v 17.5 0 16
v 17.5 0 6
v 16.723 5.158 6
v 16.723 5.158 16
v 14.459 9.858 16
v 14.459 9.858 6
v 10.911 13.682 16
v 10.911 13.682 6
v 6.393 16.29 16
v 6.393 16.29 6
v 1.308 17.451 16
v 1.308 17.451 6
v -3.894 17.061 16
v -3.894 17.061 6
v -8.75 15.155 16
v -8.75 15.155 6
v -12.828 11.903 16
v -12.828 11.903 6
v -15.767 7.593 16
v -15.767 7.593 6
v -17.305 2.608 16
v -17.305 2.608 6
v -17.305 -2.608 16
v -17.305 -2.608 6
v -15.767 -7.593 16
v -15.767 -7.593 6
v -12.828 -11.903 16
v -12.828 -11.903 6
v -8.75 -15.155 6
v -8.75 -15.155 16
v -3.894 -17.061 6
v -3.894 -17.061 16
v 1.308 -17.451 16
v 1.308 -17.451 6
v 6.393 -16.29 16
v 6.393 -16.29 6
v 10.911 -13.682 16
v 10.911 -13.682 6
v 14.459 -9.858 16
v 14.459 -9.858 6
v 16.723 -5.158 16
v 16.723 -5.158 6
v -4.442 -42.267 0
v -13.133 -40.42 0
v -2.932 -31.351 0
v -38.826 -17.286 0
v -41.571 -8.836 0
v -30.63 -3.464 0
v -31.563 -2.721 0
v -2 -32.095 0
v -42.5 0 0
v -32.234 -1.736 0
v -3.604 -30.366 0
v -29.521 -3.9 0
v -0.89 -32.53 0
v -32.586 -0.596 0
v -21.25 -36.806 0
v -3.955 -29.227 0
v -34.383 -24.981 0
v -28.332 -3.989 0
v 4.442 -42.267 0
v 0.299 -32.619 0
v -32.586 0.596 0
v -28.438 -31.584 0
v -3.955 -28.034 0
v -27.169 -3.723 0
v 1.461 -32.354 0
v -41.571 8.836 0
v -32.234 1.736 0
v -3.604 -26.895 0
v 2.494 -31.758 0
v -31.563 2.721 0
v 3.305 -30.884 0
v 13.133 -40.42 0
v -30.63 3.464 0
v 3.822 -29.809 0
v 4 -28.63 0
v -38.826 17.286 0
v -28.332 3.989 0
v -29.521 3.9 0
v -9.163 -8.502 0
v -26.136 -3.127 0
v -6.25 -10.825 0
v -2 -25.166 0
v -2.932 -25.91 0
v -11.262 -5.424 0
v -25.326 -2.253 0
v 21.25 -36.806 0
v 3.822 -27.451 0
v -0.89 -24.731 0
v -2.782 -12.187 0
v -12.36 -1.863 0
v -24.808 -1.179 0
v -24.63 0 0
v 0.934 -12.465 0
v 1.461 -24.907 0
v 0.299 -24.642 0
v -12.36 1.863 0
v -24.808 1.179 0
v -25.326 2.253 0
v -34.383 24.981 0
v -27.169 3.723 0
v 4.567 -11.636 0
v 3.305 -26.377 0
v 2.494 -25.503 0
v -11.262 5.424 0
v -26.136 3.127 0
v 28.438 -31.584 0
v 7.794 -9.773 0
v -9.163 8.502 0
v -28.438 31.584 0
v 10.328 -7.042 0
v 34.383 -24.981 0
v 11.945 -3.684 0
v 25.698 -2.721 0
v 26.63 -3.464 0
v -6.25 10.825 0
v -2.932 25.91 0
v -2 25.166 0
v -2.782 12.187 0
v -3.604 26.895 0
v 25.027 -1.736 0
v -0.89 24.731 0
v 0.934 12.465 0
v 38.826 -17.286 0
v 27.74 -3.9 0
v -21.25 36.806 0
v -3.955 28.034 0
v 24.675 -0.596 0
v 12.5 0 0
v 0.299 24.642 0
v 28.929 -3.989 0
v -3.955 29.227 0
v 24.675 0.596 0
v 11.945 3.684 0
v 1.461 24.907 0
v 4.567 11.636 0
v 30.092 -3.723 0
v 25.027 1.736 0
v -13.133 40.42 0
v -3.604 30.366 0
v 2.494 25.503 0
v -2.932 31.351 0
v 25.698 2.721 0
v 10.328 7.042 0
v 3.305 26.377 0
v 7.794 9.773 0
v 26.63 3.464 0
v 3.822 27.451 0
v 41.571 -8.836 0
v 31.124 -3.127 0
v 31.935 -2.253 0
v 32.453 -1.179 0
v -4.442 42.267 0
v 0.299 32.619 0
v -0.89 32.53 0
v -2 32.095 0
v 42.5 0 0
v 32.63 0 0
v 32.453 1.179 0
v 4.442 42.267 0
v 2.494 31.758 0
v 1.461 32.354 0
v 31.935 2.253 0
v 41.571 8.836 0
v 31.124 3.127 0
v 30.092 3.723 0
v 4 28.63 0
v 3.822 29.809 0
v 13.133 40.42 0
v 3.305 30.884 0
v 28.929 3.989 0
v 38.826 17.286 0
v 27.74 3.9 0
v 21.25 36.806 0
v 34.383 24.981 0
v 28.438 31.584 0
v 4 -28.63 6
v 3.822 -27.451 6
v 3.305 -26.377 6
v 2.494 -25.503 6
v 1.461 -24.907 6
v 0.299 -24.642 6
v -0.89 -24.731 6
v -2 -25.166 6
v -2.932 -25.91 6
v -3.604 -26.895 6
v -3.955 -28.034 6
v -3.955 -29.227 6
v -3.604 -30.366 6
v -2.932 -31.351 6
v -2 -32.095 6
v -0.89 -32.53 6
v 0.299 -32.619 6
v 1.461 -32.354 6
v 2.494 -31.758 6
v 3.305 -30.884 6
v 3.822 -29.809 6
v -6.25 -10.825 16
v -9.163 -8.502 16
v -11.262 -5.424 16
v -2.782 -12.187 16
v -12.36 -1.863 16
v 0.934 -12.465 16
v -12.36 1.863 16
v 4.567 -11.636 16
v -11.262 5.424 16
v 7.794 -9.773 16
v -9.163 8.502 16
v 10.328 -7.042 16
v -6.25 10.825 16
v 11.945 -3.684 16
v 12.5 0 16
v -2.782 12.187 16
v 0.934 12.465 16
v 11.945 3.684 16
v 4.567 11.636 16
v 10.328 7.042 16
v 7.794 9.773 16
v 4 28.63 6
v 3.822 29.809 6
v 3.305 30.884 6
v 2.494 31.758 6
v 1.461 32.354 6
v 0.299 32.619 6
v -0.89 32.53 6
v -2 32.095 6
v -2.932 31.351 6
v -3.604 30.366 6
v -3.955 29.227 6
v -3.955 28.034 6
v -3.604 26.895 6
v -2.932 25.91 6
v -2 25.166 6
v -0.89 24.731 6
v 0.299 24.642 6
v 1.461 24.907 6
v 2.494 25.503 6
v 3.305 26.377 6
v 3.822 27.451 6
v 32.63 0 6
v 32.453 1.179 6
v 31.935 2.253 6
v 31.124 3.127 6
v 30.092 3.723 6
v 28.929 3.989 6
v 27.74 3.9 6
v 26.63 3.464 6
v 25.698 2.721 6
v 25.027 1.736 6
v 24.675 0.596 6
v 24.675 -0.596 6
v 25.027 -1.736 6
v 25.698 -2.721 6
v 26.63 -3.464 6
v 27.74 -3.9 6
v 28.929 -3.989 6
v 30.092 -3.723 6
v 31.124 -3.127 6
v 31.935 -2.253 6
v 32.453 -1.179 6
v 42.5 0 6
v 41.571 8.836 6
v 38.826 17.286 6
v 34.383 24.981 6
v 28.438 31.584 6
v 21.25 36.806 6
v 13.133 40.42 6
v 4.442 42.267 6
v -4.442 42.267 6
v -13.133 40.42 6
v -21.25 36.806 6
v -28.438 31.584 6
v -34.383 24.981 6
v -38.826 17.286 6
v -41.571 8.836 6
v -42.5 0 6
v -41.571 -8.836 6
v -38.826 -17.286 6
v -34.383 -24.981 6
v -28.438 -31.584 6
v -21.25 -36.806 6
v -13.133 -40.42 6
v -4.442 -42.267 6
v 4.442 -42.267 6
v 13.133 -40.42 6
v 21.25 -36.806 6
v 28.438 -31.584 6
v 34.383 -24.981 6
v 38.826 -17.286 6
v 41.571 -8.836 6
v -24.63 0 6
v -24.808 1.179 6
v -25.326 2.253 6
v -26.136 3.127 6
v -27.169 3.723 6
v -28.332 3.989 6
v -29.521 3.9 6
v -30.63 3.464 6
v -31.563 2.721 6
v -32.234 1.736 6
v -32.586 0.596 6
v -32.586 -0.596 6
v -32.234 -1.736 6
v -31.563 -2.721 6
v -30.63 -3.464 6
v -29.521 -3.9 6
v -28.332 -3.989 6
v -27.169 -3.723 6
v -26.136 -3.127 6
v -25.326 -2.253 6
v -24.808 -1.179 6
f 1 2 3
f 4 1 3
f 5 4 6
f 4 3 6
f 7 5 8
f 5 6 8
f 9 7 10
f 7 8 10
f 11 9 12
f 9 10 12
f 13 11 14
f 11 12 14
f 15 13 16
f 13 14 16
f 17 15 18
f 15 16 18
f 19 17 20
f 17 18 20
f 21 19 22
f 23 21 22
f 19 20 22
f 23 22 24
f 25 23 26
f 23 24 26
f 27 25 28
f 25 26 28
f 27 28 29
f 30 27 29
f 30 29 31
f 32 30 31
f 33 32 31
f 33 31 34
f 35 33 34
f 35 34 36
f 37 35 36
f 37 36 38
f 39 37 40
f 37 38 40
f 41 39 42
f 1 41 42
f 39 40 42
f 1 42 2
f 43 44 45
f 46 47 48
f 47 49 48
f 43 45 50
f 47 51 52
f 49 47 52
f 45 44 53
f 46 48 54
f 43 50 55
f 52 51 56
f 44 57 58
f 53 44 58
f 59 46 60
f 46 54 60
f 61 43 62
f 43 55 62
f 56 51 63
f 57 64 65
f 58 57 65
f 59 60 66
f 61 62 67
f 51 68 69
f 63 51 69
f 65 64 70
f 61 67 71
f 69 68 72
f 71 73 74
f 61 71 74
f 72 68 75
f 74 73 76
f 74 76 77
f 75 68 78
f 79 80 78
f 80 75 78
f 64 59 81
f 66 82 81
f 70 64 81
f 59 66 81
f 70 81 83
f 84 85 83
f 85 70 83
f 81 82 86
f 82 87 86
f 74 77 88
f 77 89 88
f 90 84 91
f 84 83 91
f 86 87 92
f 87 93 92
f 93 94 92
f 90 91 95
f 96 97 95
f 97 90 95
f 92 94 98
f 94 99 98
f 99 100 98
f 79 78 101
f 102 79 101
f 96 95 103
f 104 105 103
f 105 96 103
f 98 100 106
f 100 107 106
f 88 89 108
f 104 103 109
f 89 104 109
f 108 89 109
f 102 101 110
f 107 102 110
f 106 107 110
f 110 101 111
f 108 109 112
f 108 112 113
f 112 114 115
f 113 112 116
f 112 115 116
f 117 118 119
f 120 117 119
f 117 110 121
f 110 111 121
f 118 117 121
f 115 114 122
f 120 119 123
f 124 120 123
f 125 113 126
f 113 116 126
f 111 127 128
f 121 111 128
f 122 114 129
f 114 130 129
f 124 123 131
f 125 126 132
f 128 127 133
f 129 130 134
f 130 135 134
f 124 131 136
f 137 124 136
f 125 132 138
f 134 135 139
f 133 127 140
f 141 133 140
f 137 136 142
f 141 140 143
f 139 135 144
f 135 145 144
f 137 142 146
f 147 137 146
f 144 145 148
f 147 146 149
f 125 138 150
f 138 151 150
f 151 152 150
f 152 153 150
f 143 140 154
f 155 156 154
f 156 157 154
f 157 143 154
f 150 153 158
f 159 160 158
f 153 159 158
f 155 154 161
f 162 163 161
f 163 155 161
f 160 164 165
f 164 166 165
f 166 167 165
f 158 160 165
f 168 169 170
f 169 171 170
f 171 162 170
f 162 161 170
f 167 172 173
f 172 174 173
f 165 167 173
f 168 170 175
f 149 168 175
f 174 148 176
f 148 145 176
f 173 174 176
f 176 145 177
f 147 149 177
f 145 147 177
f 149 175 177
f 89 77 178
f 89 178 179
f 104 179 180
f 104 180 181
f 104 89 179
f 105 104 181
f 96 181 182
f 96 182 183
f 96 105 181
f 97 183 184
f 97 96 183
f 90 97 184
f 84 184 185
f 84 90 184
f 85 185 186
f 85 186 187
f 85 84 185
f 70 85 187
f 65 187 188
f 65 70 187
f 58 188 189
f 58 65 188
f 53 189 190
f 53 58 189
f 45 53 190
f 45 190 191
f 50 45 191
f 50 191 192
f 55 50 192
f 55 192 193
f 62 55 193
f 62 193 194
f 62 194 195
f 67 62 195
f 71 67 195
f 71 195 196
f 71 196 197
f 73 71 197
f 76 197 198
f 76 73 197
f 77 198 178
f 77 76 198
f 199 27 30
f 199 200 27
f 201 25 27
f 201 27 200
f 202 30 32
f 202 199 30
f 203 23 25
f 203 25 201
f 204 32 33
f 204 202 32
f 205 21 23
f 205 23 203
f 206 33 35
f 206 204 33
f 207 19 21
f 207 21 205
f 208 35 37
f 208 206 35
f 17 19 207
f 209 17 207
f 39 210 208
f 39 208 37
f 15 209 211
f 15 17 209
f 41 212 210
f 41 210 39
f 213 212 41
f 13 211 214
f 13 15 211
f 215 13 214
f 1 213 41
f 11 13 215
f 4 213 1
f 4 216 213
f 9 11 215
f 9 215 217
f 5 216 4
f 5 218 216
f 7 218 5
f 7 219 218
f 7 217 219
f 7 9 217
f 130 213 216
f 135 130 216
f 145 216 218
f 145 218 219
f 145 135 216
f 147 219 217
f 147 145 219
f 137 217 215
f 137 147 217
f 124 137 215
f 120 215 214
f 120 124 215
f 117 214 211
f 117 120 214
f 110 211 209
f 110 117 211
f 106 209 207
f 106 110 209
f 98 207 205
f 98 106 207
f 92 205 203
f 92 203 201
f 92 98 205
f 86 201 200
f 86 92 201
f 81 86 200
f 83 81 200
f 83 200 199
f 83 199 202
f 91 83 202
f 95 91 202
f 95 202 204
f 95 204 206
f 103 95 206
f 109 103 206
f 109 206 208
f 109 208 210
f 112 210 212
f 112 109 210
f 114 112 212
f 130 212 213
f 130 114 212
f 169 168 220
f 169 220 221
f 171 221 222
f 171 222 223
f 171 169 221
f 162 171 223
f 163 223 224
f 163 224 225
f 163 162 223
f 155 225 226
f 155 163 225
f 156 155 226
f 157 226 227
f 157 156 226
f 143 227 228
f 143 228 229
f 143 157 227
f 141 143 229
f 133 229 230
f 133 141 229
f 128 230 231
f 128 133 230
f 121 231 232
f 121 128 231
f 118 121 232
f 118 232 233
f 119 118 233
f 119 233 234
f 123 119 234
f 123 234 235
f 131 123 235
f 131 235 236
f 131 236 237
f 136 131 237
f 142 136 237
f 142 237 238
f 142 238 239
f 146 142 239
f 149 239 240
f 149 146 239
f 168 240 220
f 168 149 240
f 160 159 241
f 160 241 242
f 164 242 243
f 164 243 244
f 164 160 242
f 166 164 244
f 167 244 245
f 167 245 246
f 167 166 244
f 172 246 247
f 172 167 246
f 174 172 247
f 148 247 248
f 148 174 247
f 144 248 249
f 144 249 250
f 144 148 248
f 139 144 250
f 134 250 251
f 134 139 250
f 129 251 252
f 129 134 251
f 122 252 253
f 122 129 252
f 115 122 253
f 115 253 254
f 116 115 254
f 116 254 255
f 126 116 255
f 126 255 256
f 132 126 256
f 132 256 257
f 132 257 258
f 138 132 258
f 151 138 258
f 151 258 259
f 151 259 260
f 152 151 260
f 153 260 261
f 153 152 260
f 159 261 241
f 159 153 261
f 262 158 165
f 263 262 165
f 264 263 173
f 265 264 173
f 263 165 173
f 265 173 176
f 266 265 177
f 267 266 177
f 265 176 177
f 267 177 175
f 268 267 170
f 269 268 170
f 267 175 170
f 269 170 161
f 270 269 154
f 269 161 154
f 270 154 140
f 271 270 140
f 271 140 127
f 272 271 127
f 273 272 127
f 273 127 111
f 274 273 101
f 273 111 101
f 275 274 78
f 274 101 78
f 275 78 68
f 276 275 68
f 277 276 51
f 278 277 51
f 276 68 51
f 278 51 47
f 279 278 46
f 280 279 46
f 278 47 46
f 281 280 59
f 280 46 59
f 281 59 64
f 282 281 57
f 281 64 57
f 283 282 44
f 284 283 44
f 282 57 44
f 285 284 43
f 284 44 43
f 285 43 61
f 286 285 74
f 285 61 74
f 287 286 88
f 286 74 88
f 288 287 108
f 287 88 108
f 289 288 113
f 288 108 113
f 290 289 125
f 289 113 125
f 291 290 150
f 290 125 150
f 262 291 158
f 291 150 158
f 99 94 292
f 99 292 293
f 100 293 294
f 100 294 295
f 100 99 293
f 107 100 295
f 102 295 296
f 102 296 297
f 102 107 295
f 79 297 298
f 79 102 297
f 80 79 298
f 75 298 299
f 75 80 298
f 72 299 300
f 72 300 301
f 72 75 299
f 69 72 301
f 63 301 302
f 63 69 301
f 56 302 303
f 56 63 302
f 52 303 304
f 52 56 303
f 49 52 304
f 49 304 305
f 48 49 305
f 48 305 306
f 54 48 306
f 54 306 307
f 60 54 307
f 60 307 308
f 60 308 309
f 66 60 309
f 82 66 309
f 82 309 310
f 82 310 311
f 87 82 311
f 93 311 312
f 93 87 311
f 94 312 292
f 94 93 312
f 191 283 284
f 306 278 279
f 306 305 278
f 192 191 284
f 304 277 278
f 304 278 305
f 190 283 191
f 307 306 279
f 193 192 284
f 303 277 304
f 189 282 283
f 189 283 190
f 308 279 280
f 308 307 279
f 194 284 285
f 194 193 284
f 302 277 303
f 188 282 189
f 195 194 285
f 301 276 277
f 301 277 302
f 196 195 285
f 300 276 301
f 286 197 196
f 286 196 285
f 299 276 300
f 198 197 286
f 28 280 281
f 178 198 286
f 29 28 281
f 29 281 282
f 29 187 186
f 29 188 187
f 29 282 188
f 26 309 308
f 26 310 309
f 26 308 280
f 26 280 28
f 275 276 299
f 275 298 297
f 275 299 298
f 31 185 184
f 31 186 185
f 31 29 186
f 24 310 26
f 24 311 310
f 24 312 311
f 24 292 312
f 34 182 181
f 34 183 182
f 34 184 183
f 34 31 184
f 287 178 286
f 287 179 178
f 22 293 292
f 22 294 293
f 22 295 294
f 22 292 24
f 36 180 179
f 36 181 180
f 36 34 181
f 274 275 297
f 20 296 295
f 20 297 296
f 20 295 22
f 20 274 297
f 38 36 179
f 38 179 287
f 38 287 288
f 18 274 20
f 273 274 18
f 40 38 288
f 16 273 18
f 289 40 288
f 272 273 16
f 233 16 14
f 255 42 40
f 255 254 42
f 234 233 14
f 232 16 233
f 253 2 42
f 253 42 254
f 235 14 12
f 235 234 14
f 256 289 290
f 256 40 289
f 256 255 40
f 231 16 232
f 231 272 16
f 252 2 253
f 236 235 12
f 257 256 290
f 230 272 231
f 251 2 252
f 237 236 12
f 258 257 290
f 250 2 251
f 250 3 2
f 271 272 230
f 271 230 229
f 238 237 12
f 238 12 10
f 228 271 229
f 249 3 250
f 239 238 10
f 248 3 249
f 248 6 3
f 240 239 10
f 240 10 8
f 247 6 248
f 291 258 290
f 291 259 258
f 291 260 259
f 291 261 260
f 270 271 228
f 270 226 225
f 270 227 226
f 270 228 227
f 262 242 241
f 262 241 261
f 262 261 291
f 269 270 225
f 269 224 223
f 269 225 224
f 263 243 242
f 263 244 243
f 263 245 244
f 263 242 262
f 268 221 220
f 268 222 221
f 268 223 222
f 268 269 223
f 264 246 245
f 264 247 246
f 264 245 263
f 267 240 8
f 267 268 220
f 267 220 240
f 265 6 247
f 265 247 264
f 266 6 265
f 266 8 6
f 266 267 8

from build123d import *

# Parameters (mm, degrees)
F0_R     = 42.5
F0_R_2   = 4
F0_R_3   = 12.5
F1_DEPTH = 6
F2_R     = 17.5
F2_R_2   = 12.5
F3_DEPTH = 10


with BuildPart() as f1:
    # F0 (on Top) → F1 (new body)
    with BuildSketch(Plane.XY):
        Circle(F0_R)
        with Locations((0, -28.630458)):
            Circle(F0_R_2, mode=Mode.SUBTRACT)
        with Locations((-28.630458, 0)):
            Circle(F0_R_2, mode=Mode.SUBTRACT)
        Circle(F0_R_3, mode=Mode.SUBTRACT)
        with Locations((28.630458, 0)):
            Circle(F0_R_2, mode=Mode.SUBTRACT)
        with Locations((0, 28.630458)):
            Circle(F0_R_2, mode=Mode.SUBTRACT)
    extrude(amount=F1_DEPTH)

    # F2 (on face) → F3 (join)
    with BuildSketch(Plane.XY.offset(6)):
        Circle(F2_R)
        Circle(F2_R_2, mode=Mode.SUBTRACT)
    extrude(amount=F3_DEPTH)


solid = f1.part
